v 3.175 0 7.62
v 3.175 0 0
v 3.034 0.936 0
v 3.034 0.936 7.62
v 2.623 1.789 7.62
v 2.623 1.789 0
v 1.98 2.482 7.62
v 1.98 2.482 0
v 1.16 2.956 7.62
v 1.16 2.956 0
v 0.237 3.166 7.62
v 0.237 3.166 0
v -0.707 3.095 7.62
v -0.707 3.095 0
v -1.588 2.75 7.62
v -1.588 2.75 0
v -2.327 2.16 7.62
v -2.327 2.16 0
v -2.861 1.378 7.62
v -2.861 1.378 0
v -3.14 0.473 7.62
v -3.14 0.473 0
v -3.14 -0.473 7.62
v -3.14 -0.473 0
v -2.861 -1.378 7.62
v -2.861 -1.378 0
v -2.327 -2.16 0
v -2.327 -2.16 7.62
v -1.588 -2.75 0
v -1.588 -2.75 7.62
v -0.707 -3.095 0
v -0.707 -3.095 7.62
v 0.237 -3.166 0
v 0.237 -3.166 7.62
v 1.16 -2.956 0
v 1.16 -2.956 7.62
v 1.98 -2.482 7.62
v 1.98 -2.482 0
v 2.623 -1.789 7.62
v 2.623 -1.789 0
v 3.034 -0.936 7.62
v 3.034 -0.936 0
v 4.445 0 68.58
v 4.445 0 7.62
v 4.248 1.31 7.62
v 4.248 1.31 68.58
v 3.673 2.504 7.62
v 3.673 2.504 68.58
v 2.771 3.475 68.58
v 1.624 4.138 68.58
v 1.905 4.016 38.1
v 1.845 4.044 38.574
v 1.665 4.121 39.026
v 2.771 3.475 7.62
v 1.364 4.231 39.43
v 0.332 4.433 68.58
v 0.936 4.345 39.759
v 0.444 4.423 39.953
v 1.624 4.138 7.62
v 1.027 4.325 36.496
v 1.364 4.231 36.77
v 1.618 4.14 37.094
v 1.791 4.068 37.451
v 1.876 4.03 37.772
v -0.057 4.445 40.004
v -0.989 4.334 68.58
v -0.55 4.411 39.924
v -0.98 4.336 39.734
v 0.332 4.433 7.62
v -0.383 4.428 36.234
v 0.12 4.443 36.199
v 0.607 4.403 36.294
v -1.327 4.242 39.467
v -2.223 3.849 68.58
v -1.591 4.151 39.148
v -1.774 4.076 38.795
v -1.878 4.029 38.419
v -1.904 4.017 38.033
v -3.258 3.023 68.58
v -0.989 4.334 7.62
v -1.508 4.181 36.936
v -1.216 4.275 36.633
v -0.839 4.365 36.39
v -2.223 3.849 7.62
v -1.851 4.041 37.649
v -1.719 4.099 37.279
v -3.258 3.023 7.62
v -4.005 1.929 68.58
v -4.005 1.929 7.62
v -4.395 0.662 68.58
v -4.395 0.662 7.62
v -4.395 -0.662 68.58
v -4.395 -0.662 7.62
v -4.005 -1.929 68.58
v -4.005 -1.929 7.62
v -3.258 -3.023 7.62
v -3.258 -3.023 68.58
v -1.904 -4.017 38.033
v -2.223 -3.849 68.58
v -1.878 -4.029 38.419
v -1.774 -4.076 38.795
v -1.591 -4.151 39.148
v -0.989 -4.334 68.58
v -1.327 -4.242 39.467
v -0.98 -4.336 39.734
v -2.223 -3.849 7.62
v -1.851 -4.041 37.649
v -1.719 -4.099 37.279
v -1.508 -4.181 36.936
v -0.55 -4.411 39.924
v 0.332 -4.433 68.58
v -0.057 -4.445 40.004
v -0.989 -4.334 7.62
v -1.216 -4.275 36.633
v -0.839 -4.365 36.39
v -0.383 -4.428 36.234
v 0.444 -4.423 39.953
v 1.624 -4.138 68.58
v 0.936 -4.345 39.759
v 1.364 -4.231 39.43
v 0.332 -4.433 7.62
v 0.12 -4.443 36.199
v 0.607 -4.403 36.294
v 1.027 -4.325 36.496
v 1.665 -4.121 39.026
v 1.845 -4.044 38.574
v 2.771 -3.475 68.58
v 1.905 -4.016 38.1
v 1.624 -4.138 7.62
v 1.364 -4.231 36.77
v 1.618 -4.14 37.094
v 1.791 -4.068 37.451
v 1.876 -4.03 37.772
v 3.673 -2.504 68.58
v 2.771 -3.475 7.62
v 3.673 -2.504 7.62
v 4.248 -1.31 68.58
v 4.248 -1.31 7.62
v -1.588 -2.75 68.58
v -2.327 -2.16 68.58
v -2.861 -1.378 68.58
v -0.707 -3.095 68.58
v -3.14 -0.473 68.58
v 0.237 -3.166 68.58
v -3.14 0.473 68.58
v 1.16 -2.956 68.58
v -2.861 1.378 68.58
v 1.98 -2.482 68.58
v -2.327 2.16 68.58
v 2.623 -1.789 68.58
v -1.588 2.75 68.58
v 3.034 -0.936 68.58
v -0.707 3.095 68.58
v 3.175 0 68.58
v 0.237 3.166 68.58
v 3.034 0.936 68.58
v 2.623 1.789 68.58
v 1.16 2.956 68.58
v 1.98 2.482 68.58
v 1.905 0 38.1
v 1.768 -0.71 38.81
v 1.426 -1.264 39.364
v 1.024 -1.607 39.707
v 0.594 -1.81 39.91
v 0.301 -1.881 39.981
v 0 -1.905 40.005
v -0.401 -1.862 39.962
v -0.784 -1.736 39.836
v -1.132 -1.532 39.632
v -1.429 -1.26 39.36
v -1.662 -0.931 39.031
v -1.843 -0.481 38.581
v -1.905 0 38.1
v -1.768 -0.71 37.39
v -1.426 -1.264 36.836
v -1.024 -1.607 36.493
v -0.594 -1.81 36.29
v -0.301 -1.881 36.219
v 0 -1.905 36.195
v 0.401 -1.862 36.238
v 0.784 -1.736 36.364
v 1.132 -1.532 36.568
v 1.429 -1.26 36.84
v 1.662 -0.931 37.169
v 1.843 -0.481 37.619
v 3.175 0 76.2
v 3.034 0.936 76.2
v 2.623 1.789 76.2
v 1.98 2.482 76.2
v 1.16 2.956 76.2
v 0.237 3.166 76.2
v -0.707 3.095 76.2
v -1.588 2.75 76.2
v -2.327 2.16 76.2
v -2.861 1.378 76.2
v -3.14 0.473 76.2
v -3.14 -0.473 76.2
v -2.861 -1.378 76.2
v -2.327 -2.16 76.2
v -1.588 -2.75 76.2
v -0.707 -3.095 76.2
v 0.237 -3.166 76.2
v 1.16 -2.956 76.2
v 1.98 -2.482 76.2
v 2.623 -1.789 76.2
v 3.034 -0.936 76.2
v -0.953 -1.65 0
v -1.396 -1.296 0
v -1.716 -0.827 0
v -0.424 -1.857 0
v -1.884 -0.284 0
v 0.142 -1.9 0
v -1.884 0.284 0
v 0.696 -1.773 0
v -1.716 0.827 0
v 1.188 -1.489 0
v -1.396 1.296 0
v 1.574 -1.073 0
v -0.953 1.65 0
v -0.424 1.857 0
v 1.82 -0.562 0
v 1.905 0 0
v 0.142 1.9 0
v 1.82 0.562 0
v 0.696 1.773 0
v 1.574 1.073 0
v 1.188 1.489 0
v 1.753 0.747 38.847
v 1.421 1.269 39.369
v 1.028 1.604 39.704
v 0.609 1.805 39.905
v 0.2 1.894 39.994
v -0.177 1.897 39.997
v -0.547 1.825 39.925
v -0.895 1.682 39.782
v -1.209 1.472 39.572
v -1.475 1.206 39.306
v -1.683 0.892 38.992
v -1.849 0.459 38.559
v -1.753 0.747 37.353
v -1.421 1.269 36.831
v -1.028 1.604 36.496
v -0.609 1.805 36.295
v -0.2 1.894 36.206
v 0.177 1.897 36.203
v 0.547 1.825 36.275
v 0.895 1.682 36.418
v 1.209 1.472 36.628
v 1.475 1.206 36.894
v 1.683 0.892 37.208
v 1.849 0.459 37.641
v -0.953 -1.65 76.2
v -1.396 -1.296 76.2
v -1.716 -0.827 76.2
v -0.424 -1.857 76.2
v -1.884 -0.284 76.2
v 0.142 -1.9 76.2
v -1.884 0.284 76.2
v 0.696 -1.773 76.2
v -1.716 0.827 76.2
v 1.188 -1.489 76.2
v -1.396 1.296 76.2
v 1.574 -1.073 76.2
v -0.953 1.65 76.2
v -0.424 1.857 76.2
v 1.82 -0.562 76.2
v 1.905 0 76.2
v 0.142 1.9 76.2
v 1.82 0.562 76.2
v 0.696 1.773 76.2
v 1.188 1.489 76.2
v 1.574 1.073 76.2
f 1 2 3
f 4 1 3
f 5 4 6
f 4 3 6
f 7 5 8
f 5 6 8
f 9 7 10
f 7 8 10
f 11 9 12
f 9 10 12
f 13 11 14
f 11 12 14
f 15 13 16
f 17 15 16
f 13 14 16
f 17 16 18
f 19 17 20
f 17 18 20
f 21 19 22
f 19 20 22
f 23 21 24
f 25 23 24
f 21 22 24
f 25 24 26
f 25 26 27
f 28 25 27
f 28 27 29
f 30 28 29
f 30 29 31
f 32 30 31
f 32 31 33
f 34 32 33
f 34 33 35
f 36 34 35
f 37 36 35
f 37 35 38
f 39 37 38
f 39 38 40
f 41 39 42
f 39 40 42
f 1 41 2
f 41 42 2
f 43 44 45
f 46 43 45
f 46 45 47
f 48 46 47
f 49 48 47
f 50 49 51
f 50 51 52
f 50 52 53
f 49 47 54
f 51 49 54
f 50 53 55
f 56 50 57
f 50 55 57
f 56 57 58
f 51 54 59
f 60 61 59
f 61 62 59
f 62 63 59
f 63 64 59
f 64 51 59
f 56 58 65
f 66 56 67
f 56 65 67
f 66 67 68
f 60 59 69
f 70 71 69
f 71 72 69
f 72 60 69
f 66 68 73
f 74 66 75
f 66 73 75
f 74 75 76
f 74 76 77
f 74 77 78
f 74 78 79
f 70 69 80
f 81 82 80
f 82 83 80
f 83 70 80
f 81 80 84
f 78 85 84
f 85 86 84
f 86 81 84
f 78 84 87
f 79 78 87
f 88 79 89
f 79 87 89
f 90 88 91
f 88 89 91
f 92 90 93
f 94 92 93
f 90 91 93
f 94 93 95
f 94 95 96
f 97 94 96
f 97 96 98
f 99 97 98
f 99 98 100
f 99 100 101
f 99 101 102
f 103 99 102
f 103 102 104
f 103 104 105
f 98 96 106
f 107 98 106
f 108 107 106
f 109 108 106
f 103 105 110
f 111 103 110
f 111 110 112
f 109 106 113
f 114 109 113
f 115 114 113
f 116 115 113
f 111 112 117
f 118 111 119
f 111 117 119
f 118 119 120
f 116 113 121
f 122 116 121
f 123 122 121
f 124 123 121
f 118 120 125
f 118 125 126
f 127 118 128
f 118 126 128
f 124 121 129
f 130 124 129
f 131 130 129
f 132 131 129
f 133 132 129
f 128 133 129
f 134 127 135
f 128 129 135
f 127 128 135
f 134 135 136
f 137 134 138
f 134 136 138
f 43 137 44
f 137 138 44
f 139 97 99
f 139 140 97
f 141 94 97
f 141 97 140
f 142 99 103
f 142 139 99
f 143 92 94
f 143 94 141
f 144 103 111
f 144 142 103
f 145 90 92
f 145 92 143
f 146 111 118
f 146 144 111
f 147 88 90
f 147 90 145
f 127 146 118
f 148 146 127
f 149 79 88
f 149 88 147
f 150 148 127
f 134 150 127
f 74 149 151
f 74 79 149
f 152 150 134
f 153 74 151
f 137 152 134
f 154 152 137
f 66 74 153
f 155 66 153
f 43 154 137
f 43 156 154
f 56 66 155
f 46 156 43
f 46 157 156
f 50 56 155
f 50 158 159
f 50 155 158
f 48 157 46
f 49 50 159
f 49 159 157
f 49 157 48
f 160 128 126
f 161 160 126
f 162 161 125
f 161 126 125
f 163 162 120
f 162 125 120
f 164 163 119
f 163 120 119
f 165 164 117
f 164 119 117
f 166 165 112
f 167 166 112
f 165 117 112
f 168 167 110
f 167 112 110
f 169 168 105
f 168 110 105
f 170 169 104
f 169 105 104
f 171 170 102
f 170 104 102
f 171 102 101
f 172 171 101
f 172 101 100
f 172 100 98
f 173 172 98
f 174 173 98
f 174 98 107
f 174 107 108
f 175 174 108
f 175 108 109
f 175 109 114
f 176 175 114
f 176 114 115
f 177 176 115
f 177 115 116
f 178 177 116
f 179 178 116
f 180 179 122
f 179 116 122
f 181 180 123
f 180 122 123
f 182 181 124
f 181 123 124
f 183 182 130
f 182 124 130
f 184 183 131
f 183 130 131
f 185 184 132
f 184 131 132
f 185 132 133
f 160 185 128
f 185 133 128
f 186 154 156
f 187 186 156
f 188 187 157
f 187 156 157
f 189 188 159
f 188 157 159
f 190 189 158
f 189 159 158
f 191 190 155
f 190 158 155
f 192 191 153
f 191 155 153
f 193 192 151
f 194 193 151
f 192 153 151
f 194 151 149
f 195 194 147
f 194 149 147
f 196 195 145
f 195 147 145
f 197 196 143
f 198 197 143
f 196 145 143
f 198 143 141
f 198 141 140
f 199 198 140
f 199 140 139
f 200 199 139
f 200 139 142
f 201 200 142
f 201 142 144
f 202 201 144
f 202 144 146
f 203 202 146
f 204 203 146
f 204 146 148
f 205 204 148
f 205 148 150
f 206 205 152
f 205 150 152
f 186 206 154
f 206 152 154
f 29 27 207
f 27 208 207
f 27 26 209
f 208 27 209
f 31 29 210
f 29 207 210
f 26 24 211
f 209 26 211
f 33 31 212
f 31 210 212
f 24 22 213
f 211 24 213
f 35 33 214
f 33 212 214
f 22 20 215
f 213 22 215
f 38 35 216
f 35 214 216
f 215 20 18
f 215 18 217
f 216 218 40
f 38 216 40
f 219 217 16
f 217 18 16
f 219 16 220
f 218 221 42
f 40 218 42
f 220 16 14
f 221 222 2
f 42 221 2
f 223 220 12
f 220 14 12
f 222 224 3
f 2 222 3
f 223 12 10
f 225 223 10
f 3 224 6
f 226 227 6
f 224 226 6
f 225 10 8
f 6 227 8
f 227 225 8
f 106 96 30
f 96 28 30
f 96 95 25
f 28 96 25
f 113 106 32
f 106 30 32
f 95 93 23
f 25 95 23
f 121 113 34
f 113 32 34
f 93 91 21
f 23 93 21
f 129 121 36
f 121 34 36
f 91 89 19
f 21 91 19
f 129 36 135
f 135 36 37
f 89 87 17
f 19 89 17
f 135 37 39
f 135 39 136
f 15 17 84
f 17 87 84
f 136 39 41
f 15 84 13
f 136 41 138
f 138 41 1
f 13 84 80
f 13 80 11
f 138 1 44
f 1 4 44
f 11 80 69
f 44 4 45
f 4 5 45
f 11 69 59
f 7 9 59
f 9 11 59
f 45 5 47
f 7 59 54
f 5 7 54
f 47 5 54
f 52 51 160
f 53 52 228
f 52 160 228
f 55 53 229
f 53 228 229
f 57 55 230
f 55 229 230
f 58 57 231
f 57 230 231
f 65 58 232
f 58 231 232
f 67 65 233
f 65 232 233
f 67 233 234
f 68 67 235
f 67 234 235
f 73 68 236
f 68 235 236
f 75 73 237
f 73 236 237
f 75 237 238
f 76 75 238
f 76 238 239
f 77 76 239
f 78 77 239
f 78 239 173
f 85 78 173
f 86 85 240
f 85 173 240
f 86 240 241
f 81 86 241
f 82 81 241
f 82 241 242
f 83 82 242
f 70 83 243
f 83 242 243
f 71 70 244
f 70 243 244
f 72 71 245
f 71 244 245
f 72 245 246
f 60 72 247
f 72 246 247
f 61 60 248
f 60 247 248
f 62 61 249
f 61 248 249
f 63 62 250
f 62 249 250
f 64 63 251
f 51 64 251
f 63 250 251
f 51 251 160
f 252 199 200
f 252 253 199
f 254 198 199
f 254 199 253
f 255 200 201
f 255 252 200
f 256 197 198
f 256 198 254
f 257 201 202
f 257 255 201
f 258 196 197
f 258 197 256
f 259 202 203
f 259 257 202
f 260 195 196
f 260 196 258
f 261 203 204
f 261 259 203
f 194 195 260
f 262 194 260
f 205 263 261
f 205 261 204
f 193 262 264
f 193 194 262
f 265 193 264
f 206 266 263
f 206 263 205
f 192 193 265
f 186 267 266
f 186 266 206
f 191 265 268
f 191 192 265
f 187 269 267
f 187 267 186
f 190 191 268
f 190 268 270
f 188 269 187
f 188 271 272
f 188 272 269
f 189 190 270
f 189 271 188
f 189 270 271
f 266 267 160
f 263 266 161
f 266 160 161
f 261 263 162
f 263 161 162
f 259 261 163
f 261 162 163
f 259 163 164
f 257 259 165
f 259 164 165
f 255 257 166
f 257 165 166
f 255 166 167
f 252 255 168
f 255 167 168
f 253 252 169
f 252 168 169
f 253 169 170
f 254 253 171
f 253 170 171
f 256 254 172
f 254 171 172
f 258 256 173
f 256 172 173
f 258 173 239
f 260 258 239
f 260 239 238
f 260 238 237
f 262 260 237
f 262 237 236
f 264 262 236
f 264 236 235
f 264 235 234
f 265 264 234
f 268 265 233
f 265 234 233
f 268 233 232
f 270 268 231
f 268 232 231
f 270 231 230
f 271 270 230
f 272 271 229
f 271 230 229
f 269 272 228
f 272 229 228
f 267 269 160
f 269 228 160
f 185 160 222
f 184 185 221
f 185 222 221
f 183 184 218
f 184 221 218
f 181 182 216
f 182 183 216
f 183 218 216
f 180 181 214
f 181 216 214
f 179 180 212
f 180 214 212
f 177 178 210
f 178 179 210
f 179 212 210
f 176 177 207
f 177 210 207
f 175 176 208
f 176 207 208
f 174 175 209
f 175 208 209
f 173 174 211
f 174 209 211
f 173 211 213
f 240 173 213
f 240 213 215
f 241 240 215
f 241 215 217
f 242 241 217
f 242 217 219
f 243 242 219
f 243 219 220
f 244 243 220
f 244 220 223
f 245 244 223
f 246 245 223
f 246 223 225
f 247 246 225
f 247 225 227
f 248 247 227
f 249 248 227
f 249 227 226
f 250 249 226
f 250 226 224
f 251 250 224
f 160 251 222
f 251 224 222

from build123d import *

# Parameters (mm, degrees)
F0_R          = 3.175
F1_DEPTH      = 7.62
F2_R          = 4.445
F3_DEPTH      = 60.96
F4_R          = 3.175
F5_DEPTH      = 7.62
F6_R          = 1.905
F7_DEPTH      = 25.4
F7_DEPTH_BACK = 25.4
F8_R          = 1.905
F9_DEPTH      = 76.201


with BuildPart() as f1:
    # F0 (on Top) → F1 (new body)
    with BuildSketch(Plane.XY):
        Circle(F0_R)
    extrude(amount=F1_DEPTH)

    # F2 (on face) → F3 (join)
    with BuildSketch(Plane.XY.offset(7.62)):
        Circle(F2_R)
    extrude(amount=F3_DEPTH)

    # F4 (on face) → F5 (join)
    with BuildSketch(Plane.XY.offset(68.58)):
        Circle(F4_R)
    extrude(amount=F5_DEPTH)

    # F6 (on Front) → F7 (cut, two sides)
    with BuildSketch(Plane.XZ) as f7_sk:
        with Locations((0, 38.1)):
            Circle(F6_R)
    extrude(amount=-F7_DEPTH, mode=Mode.SUBTRACT)
    extrude(f7_sk.sketch, amount=F7_DEPTH_BACK, mode=Mode.SUBTRACT)

    # F8 (on face) → F9 (cut, through all)
    with BuildSketch(Plane(origin=(0, 0, 0), x_dir=(1, 0, 0), z_dir=(0, 0, -1))):
        Circle(F8_R)
    extrude(amount=-F9_DEPTH, mode=Mode.SUBTRACT)


solid = f1.part
